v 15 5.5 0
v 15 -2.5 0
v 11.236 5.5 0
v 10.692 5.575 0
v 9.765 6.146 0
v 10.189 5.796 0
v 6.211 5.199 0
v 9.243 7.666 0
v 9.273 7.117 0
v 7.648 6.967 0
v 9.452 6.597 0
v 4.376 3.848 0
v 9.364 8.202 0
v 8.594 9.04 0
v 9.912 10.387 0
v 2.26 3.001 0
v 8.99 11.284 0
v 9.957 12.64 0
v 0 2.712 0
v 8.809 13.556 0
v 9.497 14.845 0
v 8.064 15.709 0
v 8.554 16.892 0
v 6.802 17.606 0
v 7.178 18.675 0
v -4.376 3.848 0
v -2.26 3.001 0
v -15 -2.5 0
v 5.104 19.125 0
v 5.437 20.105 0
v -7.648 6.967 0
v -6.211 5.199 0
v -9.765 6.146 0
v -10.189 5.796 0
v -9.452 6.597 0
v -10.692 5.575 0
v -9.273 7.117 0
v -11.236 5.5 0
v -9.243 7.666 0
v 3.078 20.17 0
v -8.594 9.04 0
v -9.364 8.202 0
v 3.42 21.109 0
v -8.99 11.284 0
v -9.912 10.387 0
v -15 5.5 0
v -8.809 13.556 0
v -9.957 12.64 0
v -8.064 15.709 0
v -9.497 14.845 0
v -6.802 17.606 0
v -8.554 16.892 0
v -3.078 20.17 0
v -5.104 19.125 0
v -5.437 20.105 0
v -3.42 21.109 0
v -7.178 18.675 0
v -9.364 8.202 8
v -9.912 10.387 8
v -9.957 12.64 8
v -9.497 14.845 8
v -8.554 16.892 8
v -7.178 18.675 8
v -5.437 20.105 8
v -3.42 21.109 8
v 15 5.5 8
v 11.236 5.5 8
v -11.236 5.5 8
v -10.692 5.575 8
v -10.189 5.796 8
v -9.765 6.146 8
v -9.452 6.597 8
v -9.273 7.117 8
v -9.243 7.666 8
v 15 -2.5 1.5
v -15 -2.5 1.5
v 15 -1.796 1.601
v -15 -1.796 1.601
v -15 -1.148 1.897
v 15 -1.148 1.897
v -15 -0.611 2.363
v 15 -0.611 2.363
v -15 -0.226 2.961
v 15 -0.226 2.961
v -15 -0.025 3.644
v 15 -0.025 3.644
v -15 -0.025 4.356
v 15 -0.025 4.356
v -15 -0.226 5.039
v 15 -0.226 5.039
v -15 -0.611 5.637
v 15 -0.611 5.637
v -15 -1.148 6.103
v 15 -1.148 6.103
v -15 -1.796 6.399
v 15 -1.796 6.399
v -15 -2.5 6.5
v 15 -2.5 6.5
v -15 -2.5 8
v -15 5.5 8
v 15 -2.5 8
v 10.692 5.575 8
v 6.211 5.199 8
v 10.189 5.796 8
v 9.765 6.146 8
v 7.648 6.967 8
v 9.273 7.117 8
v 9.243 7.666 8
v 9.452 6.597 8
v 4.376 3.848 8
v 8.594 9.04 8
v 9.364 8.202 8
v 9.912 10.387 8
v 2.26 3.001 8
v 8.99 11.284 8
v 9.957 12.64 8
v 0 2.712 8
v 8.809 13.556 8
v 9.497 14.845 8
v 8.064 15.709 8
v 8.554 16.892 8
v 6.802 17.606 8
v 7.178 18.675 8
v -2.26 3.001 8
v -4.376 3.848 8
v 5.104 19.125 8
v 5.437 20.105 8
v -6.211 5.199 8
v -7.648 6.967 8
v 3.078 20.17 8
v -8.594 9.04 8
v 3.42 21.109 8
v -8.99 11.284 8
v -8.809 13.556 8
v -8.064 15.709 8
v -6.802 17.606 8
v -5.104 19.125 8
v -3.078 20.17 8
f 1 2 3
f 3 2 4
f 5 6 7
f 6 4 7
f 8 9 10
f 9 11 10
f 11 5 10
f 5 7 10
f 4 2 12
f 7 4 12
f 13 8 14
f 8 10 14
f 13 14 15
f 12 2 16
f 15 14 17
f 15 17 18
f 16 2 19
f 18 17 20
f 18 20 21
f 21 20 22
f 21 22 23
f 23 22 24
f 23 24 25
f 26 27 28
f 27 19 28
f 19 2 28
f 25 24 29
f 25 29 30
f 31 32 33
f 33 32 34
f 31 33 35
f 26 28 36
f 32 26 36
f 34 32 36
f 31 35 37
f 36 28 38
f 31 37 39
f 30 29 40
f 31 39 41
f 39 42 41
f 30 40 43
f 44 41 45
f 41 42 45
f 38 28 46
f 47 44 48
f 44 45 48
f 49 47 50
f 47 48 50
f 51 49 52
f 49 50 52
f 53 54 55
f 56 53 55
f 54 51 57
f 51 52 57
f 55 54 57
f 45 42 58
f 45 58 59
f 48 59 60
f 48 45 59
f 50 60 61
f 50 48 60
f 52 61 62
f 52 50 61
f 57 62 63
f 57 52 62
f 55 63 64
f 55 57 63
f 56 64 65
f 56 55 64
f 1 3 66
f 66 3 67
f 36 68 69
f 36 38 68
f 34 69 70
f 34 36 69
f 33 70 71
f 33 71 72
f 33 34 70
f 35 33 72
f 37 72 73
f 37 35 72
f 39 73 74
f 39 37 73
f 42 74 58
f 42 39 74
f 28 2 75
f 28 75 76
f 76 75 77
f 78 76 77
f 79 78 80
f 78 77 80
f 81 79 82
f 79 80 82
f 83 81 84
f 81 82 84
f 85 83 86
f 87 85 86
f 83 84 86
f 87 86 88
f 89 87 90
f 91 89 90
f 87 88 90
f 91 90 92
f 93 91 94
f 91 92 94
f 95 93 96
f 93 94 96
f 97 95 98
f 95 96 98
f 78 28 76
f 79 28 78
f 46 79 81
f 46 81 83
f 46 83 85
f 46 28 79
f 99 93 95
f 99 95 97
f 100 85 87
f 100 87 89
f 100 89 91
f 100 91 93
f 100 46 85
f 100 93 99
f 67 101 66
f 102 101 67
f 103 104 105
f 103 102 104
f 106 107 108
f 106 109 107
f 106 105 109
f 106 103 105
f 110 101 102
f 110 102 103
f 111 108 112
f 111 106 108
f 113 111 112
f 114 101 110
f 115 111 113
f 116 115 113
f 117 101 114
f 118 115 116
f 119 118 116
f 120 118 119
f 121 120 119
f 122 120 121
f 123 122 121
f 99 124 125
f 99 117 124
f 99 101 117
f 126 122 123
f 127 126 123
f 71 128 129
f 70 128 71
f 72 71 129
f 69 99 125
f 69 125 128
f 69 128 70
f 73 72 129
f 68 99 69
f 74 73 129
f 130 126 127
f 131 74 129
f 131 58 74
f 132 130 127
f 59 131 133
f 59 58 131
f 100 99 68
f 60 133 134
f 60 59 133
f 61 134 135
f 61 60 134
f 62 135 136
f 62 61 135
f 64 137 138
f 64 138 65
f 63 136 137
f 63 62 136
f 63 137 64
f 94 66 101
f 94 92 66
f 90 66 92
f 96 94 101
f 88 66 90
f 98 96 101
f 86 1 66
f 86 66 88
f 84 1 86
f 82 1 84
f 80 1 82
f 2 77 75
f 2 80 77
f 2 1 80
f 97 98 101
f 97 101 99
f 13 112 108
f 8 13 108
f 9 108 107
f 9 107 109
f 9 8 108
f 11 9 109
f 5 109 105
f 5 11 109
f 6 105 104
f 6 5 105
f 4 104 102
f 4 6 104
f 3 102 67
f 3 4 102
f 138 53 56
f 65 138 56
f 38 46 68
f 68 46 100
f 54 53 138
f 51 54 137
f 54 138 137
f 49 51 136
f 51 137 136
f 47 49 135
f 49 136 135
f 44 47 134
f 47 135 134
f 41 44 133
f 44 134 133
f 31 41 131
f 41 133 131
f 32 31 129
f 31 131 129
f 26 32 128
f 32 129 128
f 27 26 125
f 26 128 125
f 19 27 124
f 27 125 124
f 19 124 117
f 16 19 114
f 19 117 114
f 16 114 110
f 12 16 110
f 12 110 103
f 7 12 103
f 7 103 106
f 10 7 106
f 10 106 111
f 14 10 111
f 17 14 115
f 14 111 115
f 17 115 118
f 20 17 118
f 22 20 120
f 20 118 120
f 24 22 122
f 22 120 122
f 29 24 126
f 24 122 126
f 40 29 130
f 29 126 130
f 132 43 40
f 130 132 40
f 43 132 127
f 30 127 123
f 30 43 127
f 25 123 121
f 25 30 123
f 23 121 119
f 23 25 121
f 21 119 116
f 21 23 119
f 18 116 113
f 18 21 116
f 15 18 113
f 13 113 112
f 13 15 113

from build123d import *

# Parameters (mm, degrees)
BOSS_EXTRUDE1_DEPTH = 8
SKETCH2_R           = 9
CUT_EXTRUDE1_DEPTH  = 35
SKETCH3_W           = 0.5
SKETCH3_H           = 1.875425002
CUT_EXTRUDE2_DEPTH  = 25
SKETCH4_R           = 2.5
CUT_EXTRUDE3_DEPTH  = 110
SKETCH6_W           = 5
SKETCH6_H           = 7.147198513
CUT_EXTRUDE4_DEPTH  = 10
FILLET1_R           = 0.5
SKETCH8_W           = 8
SKETCH8_H           = 3
BOSS_EXTRUDE2_DEPTH = 30
SKETCH9_R           = 9
CUT_EXTRUDE5_DEPTH  = 30
FILLET2_R           = 2
CUT_EXTRUDE7_DEPTH  = 30


with BuildPart() as part:
    # Sketch1 → Boss-Extrude1 (new body)
    with BuildSketch(Plane.XY):
        with BuildLine():
            Line((3.89007335, 2.5), (15, 2.5))
            Line((15, 2.5), (15, -2.5))
            Line((15, -2.5), (-15, -2.5))
            Line((-15, -2.5), (-15, 2.5))
            Line((-15, 2.5), (-3.89007335, 2.5))
            ThreePointArc((-3.89007335, 2.5), (0, 21.71234657), (3.89007335, 2.5))
        make_face()
    extrude(amount=BOSS_EXTRUDE1_DEPTH)

    # Sketch2 → Cut-Extrude1 (cut)
    with BuildSketch(Plane.XY.offset(8)):
        with Locations((0, 11.71234657)):
            Circle(SKETCH2_R)
    extrude(amount=-CUT_EXTRUDE1_DEPTH, mode=Mode.SUBTRACT)

    # Sketch3 → Cut-Extrude2 (cut)
    with BuildSketch(Plane(origin=(0, 0, 0), x_dir=(-1, 0, 0), z_dir=(0, 0, -1))):
        with Locations((0, 21.521483579)):
            Rectangle(SKETCH3_W, SKETCH3_H)
    extrude(amount=-CUT_EXTRUDE2_DEPTH, mode=Mode.SUBTRACT)

    # Sketch4 → Cut-Extrude3 (cut)
    with BuildSketch(Plane(origin=(15, 0, 0), x_dir=(0, 0, -1), z_dir=(1, 0, 0))):
        with Locations((-4, -2.5)):
            Circle(SKETCH4_R)
    extrude(amount=-CUT_EXTRUDE3_DEPTH, mode=Mode.SUBTRACT)

    # Sketch6 → Cut-Extrude4 (cut)
    with BuildSketch(Plane.XY.offset(8)):
        with Locations((0, 22.731746569)):
            Rectangle(SKETCH6_W, SKETCH6_H)
    extrude(amount=-CUT_EXTRUDE4_DEPTH, mode=Mode.SUBTRACT)

    # Fillet1
    fillet1_edges = [part.edges().sort_by_distance(p)[0] for p in [
        (-3.89007335, 2.5, 4),
        (3.89007335, 2.5, 4),
    ]]
    fillet(fillet1_edges, radius=FILLET1_R)

    # Sketch8 → Boss-Extrude2 (add)
    with BuildSketch(Plane.ZY.offset(15)):
        with Locations((4, 4)):
            Rectangle(SKETCH8_W, SKETCH8_H)
    extrude(amount=-BOSS_EXTRUDE2_DEPTH)

    # Sketch9 → Cut-Extrude5 (cut)
    with BuildSketch(Plane(origin=(0, 0, 0), x_dir=(-1, 0, 0), z_dir=(0, 0, -1))):
        with Locations((0, 11.71234657)):
            Circle(SKETCH9_R)
    extrude(amount=-CUT_EXTRUDE5_DEPTH, mode=Mode.SUBTRACT)

    # Fillet2
    fillet2_edges = [part.edges().sort_by_distance(p)[0] for p in [
        (-7.836245918, 5.5, 4),
        (7.836245918, 5.5, 4),
    ]]
    fillet(fillet2_edges, radius=FILLET2_R)

    # Sketch10 → Cut-Extrude7 (cut)
    with BuildSketch(Plane(origin=(0, 0, 0), x_dir=(-1, 0, 0), z_dir=(0, 0, -1))):
        with BuildLine():
            Line((0, 11.71234657), (3.420201433, 21.109272778))
            ThreePointArc((3.420201433, 21.109272778), (0, 24.529474212), (-3.420201433, 21.109272778))
            Line((-3.420201433, 21.109272778), (0, 11.71234657))
        make_face()
    extrude(amount=-CUT_EXTRUDE7_DEPTH, mode=Mode.SUBTRACT)


solid = part.part
